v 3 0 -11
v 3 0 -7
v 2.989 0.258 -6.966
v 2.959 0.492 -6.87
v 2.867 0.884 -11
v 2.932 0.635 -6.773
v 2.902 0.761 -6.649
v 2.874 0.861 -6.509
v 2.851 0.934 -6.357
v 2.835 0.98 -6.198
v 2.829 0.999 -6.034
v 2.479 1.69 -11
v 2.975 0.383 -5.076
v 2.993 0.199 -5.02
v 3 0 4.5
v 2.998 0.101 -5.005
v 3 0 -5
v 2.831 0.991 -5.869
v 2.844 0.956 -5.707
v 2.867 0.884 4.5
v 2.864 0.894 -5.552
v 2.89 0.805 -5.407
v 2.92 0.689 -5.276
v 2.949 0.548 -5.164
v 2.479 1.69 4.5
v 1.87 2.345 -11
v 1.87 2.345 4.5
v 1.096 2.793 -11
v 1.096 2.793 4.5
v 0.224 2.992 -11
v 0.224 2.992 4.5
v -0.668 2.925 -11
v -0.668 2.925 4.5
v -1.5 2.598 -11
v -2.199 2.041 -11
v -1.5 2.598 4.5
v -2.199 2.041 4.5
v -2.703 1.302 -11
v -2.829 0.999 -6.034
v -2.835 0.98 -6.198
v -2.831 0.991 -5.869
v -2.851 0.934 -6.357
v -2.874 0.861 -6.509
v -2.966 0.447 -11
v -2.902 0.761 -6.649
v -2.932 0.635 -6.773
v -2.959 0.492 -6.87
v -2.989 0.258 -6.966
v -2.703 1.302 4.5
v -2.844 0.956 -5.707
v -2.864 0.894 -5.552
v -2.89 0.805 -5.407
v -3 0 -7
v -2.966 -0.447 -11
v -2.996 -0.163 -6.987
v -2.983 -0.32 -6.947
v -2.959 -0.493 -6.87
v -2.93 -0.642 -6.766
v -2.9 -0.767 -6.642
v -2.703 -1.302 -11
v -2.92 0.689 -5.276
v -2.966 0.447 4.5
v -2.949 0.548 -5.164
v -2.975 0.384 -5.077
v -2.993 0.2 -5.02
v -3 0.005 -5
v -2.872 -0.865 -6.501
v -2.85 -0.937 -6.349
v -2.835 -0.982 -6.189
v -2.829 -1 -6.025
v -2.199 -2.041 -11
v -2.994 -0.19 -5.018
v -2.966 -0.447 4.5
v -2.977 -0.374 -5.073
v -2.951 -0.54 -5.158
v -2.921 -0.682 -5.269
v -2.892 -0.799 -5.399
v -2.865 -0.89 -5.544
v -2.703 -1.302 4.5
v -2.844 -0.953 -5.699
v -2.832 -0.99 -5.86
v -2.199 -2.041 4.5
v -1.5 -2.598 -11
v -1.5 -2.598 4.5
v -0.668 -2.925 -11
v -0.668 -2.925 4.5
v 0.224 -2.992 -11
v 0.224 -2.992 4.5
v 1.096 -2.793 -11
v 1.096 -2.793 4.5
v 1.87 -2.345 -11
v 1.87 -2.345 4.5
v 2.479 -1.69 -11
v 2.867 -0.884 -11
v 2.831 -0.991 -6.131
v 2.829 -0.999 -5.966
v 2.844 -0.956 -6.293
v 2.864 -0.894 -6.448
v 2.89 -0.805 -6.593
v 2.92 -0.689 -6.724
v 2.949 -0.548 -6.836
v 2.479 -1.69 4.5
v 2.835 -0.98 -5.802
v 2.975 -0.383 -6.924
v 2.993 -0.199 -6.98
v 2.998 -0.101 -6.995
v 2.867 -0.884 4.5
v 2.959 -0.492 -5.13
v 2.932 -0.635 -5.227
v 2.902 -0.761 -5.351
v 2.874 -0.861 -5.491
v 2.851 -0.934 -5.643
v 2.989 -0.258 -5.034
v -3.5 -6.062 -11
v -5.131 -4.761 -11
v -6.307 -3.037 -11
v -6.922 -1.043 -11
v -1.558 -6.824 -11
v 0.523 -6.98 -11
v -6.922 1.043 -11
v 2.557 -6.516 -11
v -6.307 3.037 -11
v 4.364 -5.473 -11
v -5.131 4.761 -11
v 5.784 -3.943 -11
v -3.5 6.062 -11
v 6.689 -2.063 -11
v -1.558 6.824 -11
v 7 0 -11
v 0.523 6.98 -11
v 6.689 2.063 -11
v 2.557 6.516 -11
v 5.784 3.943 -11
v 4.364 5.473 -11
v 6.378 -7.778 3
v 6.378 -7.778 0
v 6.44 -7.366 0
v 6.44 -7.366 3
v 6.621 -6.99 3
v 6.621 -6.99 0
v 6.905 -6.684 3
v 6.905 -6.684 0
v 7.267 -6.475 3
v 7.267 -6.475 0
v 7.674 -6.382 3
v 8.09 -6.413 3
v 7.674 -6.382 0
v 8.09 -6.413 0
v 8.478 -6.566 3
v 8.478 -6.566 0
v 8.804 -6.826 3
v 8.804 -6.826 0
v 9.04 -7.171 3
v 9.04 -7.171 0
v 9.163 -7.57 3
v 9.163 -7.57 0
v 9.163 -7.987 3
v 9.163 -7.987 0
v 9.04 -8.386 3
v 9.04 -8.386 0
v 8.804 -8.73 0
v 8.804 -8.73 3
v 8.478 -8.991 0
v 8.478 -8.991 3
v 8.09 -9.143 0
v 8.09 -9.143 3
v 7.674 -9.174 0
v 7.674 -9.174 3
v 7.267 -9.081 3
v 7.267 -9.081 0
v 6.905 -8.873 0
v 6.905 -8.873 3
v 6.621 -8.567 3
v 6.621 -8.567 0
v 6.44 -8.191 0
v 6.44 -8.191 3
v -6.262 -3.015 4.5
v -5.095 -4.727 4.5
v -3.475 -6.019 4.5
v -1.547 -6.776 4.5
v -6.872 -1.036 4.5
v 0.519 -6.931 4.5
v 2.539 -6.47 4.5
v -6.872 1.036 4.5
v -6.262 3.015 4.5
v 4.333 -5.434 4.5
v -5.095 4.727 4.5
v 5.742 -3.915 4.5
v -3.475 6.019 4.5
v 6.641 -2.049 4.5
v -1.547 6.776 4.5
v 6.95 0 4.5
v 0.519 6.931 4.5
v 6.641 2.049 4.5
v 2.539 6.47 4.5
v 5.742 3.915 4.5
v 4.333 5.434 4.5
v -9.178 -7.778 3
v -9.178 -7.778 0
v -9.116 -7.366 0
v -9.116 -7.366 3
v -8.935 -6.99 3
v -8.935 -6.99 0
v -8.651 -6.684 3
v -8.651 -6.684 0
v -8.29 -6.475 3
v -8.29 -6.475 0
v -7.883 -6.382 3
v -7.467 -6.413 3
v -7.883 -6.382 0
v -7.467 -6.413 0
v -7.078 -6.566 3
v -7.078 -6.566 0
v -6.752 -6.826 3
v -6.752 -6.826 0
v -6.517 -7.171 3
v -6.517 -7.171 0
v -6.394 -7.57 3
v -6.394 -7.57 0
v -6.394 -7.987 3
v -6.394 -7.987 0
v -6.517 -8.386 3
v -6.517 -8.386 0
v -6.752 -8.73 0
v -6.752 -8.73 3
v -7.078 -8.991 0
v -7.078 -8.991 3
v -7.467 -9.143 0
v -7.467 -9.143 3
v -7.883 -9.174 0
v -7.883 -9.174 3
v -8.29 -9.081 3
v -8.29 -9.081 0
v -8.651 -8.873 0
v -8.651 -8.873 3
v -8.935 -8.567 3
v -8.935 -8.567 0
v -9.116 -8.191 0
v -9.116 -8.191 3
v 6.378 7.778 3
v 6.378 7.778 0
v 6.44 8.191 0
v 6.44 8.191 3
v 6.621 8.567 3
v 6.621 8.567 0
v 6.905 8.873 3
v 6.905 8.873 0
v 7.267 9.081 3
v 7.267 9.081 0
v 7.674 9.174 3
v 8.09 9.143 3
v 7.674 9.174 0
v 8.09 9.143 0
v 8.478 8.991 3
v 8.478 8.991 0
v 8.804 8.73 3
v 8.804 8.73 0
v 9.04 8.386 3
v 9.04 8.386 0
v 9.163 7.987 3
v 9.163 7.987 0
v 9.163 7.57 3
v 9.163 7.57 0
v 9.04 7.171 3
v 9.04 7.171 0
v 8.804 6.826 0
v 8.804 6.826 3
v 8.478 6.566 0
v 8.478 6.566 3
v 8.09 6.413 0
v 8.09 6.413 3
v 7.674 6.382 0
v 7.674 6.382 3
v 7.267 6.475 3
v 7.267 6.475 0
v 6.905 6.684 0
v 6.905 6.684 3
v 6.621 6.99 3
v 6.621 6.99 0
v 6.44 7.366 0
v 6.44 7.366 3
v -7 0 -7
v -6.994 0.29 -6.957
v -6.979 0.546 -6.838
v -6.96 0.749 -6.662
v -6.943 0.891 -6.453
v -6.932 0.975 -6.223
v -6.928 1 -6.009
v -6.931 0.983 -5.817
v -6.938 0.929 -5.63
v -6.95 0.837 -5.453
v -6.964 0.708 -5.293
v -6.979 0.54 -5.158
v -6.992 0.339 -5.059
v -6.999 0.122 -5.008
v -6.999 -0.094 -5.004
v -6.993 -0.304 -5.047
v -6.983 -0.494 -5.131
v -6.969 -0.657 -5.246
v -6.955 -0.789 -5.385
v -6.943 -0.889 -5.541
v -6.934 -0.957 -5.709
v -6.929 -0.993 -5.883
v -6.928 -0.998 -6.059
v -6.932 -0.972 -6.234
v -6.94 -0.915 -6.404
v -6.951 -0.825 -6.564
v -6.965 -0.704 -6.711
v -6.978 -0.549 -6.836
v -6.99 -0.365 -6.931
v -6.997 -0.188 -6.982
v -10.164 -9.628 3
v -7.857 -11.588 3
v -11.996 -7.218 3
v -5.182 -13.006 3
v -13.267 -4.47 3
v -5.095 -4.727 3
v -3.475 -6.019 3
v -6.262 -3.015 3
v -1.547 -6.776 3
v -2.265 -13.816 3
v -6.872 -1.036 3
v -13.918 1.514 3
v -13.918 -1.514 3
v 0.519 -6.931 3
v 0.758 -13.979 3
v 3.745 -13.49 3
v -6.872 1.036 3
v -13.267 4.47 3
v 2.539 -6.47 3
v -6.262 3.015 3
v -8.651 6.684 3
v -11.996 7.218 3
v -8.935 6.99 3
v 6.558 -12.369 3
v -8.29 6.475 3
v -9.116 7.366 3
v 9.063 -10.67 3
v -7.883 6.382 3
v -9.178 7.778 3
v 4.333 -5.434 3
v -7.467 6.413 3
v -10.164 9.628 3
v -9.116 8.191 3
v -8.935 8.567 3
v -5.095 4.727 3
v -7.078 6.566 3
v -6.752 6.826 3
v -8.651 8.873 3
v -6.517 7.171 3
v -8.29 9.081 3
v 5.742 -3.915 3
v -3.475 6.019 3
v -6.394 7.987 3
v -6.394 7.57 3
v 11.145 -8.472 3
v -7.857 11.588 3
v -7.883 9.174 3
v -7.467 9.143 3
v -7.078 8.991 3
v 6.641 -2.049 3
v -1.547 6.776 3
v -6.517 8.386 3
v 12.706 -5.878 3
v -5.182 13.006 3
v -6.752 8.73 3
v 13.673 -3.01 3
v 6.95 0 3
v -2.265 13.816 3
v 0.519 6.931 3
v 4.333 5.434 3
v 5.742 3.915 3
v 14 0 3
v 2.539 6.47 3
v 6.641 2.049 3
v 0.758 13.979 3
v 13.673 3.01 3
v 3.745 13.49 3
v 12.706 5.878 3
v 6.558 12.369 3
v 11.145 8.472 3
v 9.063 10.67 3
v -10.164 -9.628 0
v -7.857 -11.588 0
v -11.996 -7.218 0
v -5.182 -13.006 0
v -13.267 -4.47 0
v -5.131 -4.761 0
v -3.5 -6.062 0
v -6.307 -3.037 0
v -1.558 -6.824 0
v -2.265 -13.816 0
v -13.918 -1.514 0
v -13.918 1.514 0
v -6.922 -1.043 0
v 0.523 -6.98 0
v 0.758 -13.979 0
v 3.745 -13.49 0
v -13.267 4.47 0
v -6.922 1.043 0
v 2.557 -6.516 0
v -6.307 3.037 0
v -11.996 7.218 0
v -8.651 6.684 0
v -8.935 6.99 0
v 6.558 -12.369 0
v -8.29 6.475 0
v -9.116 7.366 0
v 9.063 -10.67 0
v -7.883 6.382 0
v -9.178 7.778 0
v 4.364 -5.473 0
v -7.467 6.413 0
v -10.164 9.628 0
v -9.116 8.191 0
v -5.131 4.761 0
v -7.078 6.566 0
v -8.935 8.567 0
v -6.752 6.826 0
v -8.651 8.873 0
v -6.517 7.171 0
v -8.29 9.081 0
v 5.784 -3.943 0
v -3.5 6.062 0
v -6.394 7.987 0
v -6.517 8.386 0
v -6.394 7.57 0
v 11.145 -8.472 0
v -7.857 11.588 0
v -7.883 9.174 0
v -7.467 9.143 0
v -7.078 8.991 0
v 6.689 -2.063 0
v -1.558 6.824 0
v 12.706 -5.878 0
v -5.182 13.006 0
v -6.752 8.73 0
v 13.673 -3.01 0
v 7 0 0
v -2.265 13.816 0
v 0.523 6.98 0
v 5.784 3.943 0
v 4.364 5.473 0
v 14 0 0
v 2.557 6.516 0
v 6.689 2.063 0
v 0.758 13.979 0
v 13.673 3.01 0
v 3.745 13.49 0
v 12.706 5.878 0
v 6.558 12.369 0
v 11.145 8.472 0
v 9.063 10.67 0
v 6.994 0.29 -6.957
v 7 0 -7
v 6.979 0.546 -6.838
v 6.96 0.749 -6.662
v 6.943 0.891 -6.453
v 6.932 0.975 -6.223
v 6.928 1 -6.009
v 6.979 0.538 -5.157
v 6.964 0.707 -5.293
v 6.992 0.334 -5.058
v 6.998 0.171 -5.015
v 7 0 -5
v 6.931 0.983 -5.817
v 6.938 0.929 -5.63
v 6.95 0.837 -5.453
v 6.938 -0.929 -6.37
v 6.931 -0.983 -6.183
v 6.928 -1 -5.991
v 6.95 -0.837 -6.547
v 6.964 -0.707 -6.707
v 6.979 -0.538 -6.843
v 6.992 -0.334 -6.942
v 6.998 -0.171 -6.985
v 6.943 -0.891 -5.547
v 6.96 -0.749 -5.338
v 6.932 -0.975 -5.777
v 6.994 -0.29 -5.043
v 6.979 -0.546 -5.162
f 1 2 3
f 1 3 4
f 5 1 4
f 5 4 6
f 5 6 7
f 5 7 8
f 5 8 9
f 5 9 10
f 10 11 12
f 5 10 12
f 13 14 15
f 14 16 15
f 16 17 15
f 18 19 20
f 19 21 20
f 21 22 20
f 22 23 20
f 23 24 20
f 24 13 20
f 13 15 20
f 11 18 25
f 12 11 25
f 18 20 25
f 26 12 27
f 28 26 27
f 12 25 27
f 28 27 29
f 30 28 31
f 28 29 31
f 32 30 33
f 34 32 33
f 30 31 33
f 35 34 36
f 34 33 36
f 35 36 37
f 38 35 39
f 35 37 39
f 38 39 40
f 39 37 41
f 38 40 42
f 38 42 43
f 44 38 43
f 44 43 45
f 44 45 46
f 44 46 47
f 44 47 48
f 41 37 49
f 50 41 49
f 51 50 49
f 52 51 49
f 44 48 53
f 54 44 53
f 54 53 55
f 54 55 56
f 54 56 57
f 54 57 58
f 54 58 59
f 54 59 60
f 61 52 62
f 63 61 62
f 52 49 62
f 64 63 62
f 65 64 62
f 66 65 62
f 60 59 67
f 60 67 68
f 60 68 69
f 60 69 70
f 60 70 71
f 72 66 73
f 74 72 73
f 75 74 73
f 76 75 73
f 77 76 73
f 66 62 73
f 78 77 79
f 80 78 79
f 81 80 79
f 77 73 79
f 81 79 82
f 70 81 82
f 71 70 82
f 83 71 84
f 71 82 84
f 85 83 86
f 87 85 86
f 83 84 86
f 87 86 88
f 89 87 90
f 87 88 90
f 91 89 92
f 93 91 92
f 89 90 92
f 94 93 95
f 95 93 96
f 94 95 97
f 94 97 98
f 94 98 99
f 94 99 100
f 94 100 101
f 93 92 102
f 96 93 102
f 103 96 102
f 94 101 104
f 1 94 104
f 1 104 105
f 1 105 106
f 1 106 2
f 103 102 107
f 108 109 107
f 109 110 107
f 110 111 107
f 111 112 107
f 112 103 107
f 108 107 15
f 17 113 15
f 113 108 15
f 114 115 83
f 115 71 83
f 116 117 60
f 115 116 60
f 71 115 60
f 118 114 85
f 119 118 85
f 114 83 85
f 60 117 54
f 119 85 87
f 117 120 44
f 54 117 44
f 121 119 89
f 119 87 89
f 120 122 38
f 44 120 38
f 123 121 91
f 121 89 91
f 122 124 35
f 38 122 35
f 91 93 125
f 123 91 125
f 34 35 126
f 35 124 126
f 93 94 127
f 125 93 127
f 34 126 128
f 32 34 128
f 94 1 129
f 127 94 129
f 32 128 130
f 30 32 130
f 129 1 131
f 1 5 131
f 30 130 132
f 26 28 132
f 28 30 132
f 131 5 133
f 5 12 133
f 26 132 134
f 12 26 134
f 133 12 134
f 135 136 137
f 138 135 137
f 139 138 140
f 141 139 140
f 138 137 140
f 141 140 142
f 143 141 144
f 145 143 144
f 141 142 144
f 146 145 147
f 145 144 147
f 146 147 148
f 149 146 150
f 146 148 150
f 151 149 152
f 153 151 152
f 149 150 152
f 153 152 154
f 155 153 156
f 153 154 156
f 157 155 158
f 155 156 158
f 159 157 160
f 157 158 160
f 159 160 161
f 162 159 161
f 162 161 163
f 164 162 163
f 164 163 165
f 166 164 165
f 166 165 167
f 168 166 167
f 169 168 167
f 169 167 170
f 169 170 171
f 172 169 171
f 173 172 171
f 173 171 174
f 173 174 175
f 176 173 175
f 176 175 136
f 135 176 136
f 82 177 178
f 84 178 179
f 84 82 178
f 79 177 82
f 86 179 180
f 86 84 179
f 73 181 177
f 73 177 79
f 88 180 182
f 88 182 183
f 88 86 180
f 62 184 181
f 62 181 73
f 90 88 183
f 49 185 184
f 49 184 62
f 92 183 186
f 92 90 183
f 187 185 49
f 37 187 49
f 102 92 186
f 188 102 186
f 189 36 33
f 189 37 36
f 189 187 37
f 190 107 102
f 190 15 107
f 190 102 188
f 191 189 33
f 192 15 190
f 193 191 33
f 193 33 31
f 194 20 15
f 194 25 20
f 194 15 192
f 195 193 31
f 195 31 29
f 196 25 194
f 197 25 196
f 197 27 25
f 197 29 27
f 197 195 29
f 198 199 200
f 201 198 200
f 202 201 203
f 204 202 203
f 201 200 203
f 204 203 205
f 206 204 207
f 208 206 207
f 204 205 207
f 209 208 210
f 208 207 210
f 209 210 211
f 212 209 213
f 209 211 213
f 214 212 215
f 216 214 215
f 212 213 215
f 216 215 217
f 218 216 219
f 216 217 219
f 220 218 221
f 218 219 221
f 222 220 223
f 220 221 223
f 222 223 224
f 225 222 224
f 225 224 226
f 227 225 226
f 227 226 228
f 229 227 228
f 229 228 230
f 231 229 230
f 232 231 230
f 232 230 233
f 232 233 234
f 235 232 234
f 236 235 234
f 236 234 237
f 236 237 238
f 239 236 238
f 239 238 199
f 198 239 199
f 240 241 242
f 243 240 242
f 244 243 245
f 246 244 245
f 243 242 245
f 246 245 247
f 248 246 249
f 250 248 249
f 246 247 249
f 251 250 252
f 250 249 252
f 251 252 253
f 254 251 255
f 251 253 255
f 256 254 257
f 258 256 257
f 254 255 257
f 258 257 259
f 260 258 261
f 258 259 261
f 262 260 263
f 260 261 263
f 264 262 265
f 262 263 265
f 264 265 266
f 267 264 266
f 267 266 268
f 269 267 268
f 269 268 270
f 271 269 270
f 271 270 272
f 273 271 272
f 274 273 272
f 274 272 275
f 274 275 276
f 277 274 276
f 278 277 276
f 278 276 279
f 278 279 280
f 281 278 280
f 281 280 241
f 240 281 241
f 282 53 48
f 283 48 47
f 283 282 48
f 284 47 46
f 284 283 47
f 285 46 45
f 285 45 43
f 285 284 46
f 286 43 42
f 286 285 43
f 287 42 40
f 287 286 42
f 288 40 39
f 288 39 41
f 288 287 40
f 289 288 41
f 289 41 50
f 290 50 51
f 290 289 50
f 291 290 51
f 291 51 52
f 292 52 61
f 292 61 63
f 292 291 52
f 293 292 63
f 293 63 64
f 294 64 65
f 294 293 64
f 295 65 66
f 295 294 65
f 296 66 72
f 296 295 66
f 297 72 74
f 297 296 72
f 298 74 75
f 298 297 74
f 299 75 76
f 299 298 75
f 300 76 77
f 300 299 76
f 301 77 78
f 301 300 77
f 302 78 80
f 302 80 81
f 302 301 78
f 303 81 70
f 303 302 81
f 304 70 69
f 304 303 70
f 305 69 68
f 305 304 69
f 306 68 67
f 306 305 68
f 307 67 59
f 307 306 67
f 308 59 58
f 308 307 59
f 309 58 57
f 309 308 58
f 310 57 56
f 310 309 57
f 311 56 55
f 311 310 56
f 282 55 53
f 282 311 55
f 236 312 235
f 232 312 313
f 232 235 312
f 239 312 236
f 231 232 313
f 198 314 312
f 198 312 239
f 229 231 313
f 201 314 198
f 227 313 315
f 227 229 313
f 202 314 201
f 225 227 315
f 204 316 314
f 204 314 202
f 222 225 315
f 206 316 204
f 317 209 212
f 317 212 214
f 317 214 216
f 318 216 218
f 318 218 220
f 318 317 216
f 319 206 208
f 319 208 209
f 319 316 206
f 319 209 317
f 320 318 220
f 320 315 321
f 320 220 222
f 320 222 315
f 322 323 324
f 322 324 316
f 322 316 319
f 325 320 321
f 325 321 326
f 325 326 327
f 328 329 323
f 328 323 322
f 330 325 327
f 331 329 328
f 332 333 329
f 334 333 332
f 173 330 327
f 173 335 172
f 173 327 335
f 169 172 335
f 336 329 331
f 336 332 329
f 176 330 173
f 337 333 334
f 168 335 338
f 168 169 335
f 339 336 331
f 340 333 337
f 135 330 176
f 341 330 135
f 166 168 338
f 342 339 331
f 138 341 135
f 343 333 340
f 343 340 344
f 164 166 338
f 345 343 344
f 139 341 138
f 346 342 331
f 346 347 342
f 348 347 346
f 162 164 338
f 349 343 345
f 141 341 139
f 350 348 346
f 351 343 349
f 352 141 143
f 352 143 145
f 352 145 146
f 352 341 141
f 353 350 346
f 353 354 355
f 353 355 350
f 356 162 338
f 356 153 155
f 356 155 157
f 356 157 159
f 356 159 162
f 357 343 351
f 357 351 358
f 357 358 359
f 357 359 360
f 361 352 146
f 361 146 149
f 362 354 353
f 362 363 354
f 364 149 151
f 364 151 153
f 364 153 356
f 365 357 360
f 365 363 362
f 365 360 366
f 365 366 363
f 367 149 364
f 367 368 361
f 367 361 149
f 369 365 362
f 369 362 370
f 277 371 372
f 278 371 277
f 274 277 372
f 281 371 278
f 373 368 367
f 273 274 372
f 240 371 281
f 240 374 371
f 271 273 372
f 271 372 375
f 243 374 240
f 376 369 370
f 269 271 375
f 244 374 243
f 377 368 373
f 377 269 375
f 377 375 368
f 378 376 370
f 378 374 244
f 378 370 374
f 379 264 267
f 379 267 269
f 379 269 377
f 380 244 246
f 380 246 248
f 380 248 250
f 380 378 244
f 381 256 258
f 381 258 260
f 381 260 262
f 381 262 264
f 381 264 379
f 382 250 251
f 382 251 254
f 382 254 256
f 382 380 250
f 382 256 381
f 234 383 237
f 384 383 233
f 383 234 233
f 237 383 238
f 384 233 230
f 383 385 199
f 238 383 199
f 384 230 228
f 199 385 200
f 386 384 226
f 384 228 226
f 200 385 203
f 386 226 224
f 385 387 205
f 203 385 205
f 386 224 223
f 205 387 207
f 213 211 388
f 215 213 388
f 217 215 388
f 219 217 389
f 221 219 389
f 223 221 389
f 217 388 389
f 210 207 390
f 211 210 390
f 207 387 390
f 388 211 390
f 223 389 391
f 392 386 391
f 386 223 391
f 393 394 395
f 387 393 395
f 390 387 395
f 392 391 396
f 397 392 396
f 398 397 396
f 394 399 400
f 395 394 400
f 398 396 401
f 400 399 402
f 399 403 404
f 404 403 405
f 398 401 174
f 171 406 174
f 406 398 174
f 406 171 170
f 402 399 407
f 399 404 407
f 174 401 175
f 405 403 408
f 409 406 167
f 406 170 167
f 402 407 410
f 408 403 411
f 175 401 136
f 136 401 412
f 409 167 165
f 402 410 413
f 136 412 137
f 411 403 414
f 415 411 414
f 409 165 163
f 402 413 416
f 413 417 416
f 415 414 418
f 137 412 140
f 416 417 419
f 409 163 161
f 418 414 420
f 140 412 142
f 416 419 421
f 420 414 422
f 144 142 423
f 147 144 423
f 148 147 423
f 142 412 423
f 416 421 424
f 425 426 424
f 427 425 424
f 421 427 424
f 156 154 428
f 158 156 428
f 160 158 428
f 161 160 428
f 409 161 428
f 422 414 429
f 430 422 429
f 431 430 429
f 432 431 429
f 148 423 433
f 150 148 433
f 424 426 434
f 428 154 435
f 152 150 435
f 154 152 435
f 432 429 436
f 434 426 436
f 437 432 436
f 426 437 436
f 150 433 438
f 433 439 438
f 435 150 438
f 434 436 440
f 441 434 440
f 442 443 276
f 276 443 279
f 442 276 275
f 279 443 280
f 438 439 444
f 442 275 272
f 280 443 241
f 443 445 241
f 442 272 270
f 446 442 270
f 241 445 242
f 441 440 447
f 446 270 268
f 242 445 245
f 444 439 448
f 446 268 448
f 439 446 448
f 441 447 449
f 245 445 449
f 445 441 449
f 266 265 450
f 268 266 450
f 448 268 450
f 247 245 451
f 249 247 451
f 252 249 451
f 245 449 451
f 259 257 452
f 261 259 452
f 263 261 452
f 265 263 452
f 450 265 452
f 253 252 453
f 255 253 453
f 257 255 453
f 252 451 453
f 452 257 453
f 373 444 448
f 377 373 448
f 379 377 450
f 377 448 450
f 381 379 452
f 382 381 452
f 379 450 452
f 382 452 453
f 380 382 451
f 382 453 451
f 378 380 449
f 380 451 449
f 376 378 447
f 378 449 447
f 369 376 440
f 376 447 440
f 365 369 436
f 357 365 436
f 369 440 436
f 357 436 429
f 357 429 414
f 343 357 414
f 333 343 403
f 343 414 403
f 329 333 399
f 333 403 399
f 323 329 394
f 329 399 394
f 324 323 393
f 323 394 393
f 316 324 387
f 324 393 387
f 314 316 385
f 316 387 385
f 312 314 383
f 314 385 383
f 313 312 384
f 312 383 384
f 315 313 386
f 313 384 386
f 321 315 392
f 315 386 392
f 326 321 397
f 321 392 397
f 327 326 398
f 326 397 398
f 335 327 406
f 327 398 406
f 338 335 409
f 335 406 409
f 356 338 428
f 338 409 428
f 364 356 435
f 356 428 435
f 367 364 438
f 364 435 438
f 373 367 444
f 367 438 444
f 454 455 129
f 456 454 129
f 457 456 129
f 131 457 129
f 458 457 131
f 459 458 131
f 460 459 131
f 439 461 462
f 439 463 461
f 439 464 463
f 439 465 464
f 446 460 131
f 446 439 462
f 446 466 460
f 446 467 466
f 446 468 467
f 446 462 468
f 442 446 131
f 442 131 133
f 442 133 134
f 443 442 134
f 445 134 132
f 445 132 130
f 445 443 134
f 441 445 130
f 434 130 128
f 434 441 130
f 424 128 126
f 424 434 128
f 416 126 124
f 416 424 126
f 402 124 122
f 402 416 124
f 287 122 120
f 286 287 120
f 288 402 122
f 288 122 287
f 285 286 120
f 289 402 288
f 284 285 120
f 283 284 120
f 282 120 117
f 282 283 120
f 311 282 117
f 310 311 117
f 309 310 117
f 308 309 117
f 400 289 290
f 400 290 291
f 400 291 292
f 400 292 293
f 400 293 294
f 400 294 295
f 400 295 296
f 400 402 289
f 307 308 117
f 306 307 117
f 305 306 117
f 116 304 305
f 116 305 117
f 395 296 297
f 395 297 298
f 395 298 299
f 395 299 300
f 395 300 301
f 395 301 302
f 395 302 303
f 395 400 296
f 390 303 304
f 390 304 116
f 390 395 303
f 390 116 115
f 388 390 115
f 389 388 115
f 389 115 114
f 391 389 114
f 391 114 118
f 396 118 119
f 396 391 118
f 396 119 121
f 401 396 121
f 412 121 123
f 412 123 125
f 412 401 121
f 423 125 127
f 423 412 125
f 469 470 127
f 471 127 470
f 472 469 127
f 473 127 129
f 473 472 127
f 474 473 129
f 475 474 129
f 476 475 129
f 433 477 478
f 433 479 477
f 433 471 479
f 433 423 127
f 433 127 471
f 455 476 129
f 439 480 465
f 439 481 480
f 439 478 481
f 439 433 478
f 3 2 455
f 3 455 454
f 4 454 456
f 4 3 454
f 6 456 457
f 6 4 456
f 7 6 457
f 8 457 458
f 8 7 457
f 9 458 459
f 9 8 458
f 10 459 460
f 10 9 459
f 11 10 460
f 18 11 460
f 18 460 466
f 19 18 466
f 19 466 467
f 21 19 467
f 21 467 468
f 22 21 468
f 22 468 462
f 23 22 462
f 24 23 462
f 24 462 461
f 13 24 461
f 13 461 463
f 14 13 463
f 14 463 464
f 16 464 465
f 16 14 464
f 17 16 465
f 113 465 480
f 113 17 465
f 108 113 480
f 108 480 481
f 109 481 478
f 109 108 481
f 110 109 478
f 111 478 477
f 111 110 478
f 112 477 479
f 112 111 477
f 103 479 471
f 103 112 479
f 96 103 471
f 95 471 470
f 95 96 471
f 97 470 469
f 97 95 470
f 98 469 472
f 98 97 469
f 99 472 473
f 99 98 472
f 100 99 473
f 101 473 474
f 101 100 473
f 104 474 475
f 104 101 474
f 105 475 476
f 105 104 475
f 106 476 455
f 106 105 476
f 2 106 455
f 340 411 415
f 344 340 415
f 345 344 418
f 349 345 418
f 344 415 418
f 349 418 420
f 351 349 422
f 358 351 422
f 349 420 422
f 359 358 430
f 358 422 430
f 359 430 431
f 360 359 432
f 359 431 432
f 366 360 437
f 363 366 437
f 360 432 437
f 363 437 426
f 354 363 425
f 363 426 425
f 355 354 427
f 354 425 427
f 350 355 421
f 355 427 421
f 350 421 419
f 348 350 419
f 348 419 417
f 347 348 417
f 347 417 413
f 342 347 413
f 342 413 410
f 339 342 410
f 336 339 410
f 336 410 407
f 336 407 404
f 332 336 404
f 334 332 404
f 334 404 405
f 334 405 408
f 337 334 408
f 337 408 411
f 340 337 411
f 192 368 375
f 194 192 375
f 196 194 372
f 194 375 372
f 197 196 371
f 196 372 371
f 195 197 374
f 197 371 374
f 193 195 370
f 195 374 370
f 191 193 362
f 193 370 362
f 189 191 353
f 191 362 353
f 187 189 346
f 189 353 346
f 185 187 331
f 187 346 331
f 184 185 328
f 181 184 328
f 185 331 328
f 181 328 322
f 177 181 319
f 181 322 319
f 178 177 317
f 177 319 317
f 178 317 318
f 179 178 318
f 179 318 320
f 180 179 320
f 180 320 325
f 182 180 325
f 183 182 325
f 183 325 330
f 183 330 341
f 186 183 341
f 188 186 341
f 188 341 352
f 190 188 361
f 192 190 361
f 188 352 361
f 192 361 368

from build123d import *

# Parameters (mm, degrees)
SKETCH1_R                            = 14
BOSS_EXTRUDE1_DEPTH                  = 3
SKETCH2_R                            = 6.95
BOSS_EXTRUDE2_DEPTH                  = 1.5
SKETCH3_R                            = 3
CUT_EXTRUDE1_DEPTH                   = 21.303940504
SKETCH4_R                            = 7
SKETCH4_R_2                          = 3
SHAFT_HUB_COLLAR_L11_DEPTH           = 11
SKETCH5_R                            = 1.4
FLANGE_FOUR_D2P8_PCD22_DEPTH         = 3.01
DIN1481_D2_CROSS_PIN_HOLE_DEPTH      = 23.649503306
DIN1481_D2_CROSS_PIN_HOLE_DEPTH_BACK = 23.649503306
SKETCH6_R                            = 1


with BuildPart() as part:
    # Sketch1 → Boss-Extrude1 (new body)
    with BuildSketch(Plane.XY):
        Circle(SKETCH1_R)
    extrude(amount=BOSS_EXTRUDE1_DEPTH)

    # Sketch2 → Boss-Extrude2 (add)
    with BuildSketch(Plane.XY.offset(3)):
        Circle(SKETCH2_R)
    extrude(amount=BOSS_EXTRUDE2_DEPTH)

    # Sketch3 → Cut-Extrude1 (cut, through all)
    with BuildSketch(Plane.XY.offset(4.5)):
        Circle(SKETCH3_R)
    extrude(amount=-CUT_EXTRUDE1_DEPTH, mode=Mode.SUBTRACT)

    # Sketch4 → Shaft_Hub_Collar_L11 (add)
    with BuildSketch(Plane.XY):
        Circle(SKETCH4_R)
        Circle(SKETCH4_R_2, mode=Mode.SUBTRACT)
    extrude(amount=-SHAFT_HUB_COLLAR_L11_DEPTH)

    # Sketch5 → Flange_Four_D2p8_PCD22 (cut)
    with BuildSketch(Plane(origin=(0, 0, 0), x_dir=(-1, 0, 0), z_dir=(0, 0, -1))):
        with Locations((-7.778174593, 7.778174593)):
            Circle(SKETCH5_R)
        with Locations((7.778174593, 7.778174593)):
            Circle(SKETCH5_R)
        with Locations((7.778174593, -7.778174593)):
            Circle(SKETCH5_R)
        with Locations((-7.778174593, -7.778174593)):
            Circle(SKETCH5_R)
    extrude(amount=-FLANGE_FOUR_D2P8_PCD22_DEPTH, mode=Mode.SUBTRACT)

    # Sketch6 → DIN1481_D2_Cross_Pin_Hole (cut, two sides: drawn at the far end of the back side and taken through both)
    with BuildSketch(Plane(origin=(0, 0, 0), x_dir=(0, 0, -1), z_dir=(1, 0, 0)).offset(-DIN1481_D2_CROSS_PIN_HOLE_DEPTH_BACK)):
        with Locations((6, 0)):
            Circle(SKETCH6_R)
    extrude(amount=DIN1481_D2_CROSS_PIN_HOLE_DEPTH + DIN1481_D2_CROSS_PIN_HOLE_DEPTH_BACK, mode=Mode.SUBTRACT)


solid = part.part
